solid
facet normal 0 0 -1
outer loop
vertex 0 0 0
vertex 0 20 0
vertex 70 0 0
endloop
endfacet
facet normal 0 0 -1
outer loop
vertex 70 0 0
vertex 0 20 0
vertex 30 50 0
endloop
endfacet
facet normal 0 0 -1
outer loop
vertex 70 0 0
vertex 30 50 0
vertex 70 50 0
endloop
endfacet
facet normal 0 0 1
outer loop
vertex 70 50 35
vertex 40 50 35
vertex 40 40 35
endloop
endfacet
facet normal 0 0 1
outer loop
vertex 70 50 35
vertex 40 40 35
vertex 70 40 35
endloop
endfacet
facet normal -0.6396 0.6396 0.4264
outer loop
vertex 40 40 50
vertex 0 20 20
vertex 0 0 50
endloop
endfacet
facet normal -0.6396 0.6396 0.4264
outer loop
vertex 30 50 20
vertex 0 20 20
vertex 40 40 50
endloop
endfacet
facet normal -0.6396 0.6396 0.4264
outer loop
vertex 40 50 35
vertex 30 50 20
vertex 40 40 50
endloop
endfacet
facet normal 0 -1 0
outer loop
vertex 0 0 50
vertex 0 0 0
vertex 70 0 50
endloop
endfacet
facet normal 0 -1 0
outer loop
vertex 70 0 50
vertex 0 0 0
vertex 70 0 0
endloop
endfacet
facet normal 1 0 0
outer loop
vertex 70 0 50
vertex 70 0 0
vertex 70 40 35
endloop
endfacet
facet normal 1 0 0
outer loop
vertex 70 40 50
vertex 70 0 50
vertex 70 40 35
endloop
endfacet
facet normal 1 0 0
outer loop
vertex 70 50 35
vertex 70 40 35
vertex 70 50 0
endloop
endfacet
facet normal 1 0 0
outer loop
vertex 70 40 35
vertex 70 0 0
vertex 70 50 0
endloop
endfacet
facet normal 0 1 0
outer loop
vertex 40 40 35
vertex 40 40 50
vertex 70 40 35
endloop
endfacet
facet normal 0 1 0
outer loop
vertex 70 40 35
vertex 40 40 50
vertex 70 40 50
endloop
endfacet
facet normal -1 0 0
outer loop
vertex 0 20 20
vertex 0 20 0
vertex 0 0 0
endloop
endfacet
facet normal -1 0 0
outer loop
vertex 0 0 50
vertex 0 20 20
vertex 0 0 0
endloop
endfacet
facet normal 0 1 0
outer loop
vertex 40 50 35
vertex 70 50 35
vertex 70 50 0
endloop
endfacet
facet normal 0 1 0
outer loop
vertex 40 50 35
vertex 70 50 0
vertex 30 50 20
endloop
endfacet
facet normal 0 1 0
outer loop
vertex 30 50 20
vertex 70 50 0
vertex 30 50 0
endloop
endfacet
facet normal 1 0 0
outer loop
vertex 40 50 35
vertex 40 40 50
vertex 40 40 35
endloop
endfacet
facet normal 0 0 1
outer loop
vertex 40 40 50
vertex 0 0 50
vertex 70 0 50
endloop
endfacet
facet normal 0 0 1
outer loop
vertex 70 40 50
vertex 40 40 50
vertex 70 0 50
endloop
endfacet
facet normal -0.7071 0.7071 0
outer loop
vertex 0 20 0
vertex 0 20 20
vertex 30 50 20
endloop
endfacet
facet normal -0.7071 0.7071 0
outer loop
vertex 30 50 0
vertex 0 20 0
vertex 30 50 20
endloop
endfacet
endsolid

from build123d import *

# Parameters (mm, degrees)
SKETCH1_W           = 70
SKETCH1_H           = 50
BOSS_EXTRUDE1_DEPTH = 50
CUT_EXTRUDE1_DEPTH  = 50
CUT_EXTRUDE3_DEPTH  = 30
BOSS_EXTRUDE2_DEPTH = 30
SKETCH6_W           = 70
SKETCH6_H           = 50
CUT_EXTRUDE4_DEPTH  = 30
BOSS_EXTRUDE3_DEPTH = 30
SKETCH8_W           = 30
SKETCH8_H           = 10
CUT_EXTRUDE6_DEPTH  = 15
BOSS_EXTRUDE4_DEPTH = 15
BOSS_EXTRUDE5_DEPTH = 15
SKETCH11_W          = 15
SKETCH11_H          = 10
CUT_EXTRUDE8_DEPTH  = 30


with BuildPart() as part:
    # Sketch1 → Boss-Extrude1 (new body)
    with BuildSketch(Plane.XY):
        with Locations((35, 25)):
            Rectangle(SKETCH1_W, SKETCH1_H)
    extrude(amount=BOSS_EXTRUDE1_DEPTH)

    # Sketch2 → Cut-Extrude1 (cut)
    with BuildSketch(Plane.XY.offset(50)):
        Polygon((0, 20), (30, 50), (0, 50), align=None)
    extrude(amount=-CUT_EXTRUDE1_DEPTH, mode=Mode.SUBTRACT)

    # Sketch3 → Cut-Extrude3 (cut)
    with BuildSketch(Plane.XY.offset(50)):
        Polygon((0, 0), (40, 40), (40, 50), (30, 50), (0, 20), align=None)
    extrude(amount=-CUT_EXTRUDE3_DEPTH, mode=Mode.SUBTRACT)

    # Sketch4 → Boss-Extrude2 (add)
    with BuildSketch(Plane(origin=(-13.636363636, 13.636363636, 9.090909091), x_dir=(0.768706115, 0.532181156, 0.354787438), z_dir=(-0.639602149, 0.639602149, 0.426401433))):
        Polygon((17.73937188, -5.547001962), (17.73937188, -41.602514717), (69.774862727, -19.414506868), (56.765990015, 11.094003925), align=None)
    extrude(amount=-BOSS_EXTRUDE2_DEPTH)

    # Sketch6 → Cut-Extrude4 (cut)
    with BuildSketch(Plane.XZ):
        with Locations((35, 25)):
            Rectangle(SKETCH6_W, SKETCH6_H)
    extrude(amount=CUT_EXTRUDE4_DEPTH, mode=Mode.SUBTRACT)

    # Sketch7 → Boss-Extrude3 (add)
    with BuildSketch(Plane.ZY):
        Polygon((20, 20), (20, 0), (50, 0), align=None)
    extrude(amount=-BOSS_EXTRUDE3_DEPTH)

    # Sketch8 → Cut-Extrude6 (cut)
    with BuildSketch(Plane.XY.offset(50)):
        with Locations((55, 45)):
            Rectangle(SKETCH8_W, SKETCH8_H)
    extrude(amount=-CUT_EXTRUDE6_DEPTH, mode=Mode.SUBTRACT)

    # Sketch9 → Boss-Extrude4 (add)
    with BuildSketch(Plane(origin=(-13.636363636, 13.636363636, 9.090909091), x_dir=(-0.768706115, -0.532181156, -0.354787438), z_dir=(0.639602149, -0.639602149, -0.426401433))):
        Polygon((-56.765990015, 11.094003925), (-69.774862727, -19.414506868), (-69.774862727, -1.386750491), align=None)
    extrude(amount=BOSS_EXTRUDE4_DEPTH)

    # Sketch10 → Boss-Extrude5 (add)
    with BuildSketch(Plane(origin=(0, 50, 0), x_dir=(1, 0, 0), z_dir=(0, 1, 0))):
        Polygon((30, -20), (40, -20), (40, -35), align=None)
    extrude(amount=-BOSS_EXTRUDE5_DEPTH)

    # Sketch11 → Cut-Extrude8 (cut)
    with BuildSketch(Plane(origin=(70, 0, 0), x_dir=(0, 0, -1), z_dir=(1, 0, 0))):
        with Locations((-42.5, 45)):
            Rectangle(SKETCH11_W, SKETCH11_H)
    extrude(amount=-CUT_EXTRUDE8_DEPTH, mode=Mode.SUBTRACT)


solid = part.part
